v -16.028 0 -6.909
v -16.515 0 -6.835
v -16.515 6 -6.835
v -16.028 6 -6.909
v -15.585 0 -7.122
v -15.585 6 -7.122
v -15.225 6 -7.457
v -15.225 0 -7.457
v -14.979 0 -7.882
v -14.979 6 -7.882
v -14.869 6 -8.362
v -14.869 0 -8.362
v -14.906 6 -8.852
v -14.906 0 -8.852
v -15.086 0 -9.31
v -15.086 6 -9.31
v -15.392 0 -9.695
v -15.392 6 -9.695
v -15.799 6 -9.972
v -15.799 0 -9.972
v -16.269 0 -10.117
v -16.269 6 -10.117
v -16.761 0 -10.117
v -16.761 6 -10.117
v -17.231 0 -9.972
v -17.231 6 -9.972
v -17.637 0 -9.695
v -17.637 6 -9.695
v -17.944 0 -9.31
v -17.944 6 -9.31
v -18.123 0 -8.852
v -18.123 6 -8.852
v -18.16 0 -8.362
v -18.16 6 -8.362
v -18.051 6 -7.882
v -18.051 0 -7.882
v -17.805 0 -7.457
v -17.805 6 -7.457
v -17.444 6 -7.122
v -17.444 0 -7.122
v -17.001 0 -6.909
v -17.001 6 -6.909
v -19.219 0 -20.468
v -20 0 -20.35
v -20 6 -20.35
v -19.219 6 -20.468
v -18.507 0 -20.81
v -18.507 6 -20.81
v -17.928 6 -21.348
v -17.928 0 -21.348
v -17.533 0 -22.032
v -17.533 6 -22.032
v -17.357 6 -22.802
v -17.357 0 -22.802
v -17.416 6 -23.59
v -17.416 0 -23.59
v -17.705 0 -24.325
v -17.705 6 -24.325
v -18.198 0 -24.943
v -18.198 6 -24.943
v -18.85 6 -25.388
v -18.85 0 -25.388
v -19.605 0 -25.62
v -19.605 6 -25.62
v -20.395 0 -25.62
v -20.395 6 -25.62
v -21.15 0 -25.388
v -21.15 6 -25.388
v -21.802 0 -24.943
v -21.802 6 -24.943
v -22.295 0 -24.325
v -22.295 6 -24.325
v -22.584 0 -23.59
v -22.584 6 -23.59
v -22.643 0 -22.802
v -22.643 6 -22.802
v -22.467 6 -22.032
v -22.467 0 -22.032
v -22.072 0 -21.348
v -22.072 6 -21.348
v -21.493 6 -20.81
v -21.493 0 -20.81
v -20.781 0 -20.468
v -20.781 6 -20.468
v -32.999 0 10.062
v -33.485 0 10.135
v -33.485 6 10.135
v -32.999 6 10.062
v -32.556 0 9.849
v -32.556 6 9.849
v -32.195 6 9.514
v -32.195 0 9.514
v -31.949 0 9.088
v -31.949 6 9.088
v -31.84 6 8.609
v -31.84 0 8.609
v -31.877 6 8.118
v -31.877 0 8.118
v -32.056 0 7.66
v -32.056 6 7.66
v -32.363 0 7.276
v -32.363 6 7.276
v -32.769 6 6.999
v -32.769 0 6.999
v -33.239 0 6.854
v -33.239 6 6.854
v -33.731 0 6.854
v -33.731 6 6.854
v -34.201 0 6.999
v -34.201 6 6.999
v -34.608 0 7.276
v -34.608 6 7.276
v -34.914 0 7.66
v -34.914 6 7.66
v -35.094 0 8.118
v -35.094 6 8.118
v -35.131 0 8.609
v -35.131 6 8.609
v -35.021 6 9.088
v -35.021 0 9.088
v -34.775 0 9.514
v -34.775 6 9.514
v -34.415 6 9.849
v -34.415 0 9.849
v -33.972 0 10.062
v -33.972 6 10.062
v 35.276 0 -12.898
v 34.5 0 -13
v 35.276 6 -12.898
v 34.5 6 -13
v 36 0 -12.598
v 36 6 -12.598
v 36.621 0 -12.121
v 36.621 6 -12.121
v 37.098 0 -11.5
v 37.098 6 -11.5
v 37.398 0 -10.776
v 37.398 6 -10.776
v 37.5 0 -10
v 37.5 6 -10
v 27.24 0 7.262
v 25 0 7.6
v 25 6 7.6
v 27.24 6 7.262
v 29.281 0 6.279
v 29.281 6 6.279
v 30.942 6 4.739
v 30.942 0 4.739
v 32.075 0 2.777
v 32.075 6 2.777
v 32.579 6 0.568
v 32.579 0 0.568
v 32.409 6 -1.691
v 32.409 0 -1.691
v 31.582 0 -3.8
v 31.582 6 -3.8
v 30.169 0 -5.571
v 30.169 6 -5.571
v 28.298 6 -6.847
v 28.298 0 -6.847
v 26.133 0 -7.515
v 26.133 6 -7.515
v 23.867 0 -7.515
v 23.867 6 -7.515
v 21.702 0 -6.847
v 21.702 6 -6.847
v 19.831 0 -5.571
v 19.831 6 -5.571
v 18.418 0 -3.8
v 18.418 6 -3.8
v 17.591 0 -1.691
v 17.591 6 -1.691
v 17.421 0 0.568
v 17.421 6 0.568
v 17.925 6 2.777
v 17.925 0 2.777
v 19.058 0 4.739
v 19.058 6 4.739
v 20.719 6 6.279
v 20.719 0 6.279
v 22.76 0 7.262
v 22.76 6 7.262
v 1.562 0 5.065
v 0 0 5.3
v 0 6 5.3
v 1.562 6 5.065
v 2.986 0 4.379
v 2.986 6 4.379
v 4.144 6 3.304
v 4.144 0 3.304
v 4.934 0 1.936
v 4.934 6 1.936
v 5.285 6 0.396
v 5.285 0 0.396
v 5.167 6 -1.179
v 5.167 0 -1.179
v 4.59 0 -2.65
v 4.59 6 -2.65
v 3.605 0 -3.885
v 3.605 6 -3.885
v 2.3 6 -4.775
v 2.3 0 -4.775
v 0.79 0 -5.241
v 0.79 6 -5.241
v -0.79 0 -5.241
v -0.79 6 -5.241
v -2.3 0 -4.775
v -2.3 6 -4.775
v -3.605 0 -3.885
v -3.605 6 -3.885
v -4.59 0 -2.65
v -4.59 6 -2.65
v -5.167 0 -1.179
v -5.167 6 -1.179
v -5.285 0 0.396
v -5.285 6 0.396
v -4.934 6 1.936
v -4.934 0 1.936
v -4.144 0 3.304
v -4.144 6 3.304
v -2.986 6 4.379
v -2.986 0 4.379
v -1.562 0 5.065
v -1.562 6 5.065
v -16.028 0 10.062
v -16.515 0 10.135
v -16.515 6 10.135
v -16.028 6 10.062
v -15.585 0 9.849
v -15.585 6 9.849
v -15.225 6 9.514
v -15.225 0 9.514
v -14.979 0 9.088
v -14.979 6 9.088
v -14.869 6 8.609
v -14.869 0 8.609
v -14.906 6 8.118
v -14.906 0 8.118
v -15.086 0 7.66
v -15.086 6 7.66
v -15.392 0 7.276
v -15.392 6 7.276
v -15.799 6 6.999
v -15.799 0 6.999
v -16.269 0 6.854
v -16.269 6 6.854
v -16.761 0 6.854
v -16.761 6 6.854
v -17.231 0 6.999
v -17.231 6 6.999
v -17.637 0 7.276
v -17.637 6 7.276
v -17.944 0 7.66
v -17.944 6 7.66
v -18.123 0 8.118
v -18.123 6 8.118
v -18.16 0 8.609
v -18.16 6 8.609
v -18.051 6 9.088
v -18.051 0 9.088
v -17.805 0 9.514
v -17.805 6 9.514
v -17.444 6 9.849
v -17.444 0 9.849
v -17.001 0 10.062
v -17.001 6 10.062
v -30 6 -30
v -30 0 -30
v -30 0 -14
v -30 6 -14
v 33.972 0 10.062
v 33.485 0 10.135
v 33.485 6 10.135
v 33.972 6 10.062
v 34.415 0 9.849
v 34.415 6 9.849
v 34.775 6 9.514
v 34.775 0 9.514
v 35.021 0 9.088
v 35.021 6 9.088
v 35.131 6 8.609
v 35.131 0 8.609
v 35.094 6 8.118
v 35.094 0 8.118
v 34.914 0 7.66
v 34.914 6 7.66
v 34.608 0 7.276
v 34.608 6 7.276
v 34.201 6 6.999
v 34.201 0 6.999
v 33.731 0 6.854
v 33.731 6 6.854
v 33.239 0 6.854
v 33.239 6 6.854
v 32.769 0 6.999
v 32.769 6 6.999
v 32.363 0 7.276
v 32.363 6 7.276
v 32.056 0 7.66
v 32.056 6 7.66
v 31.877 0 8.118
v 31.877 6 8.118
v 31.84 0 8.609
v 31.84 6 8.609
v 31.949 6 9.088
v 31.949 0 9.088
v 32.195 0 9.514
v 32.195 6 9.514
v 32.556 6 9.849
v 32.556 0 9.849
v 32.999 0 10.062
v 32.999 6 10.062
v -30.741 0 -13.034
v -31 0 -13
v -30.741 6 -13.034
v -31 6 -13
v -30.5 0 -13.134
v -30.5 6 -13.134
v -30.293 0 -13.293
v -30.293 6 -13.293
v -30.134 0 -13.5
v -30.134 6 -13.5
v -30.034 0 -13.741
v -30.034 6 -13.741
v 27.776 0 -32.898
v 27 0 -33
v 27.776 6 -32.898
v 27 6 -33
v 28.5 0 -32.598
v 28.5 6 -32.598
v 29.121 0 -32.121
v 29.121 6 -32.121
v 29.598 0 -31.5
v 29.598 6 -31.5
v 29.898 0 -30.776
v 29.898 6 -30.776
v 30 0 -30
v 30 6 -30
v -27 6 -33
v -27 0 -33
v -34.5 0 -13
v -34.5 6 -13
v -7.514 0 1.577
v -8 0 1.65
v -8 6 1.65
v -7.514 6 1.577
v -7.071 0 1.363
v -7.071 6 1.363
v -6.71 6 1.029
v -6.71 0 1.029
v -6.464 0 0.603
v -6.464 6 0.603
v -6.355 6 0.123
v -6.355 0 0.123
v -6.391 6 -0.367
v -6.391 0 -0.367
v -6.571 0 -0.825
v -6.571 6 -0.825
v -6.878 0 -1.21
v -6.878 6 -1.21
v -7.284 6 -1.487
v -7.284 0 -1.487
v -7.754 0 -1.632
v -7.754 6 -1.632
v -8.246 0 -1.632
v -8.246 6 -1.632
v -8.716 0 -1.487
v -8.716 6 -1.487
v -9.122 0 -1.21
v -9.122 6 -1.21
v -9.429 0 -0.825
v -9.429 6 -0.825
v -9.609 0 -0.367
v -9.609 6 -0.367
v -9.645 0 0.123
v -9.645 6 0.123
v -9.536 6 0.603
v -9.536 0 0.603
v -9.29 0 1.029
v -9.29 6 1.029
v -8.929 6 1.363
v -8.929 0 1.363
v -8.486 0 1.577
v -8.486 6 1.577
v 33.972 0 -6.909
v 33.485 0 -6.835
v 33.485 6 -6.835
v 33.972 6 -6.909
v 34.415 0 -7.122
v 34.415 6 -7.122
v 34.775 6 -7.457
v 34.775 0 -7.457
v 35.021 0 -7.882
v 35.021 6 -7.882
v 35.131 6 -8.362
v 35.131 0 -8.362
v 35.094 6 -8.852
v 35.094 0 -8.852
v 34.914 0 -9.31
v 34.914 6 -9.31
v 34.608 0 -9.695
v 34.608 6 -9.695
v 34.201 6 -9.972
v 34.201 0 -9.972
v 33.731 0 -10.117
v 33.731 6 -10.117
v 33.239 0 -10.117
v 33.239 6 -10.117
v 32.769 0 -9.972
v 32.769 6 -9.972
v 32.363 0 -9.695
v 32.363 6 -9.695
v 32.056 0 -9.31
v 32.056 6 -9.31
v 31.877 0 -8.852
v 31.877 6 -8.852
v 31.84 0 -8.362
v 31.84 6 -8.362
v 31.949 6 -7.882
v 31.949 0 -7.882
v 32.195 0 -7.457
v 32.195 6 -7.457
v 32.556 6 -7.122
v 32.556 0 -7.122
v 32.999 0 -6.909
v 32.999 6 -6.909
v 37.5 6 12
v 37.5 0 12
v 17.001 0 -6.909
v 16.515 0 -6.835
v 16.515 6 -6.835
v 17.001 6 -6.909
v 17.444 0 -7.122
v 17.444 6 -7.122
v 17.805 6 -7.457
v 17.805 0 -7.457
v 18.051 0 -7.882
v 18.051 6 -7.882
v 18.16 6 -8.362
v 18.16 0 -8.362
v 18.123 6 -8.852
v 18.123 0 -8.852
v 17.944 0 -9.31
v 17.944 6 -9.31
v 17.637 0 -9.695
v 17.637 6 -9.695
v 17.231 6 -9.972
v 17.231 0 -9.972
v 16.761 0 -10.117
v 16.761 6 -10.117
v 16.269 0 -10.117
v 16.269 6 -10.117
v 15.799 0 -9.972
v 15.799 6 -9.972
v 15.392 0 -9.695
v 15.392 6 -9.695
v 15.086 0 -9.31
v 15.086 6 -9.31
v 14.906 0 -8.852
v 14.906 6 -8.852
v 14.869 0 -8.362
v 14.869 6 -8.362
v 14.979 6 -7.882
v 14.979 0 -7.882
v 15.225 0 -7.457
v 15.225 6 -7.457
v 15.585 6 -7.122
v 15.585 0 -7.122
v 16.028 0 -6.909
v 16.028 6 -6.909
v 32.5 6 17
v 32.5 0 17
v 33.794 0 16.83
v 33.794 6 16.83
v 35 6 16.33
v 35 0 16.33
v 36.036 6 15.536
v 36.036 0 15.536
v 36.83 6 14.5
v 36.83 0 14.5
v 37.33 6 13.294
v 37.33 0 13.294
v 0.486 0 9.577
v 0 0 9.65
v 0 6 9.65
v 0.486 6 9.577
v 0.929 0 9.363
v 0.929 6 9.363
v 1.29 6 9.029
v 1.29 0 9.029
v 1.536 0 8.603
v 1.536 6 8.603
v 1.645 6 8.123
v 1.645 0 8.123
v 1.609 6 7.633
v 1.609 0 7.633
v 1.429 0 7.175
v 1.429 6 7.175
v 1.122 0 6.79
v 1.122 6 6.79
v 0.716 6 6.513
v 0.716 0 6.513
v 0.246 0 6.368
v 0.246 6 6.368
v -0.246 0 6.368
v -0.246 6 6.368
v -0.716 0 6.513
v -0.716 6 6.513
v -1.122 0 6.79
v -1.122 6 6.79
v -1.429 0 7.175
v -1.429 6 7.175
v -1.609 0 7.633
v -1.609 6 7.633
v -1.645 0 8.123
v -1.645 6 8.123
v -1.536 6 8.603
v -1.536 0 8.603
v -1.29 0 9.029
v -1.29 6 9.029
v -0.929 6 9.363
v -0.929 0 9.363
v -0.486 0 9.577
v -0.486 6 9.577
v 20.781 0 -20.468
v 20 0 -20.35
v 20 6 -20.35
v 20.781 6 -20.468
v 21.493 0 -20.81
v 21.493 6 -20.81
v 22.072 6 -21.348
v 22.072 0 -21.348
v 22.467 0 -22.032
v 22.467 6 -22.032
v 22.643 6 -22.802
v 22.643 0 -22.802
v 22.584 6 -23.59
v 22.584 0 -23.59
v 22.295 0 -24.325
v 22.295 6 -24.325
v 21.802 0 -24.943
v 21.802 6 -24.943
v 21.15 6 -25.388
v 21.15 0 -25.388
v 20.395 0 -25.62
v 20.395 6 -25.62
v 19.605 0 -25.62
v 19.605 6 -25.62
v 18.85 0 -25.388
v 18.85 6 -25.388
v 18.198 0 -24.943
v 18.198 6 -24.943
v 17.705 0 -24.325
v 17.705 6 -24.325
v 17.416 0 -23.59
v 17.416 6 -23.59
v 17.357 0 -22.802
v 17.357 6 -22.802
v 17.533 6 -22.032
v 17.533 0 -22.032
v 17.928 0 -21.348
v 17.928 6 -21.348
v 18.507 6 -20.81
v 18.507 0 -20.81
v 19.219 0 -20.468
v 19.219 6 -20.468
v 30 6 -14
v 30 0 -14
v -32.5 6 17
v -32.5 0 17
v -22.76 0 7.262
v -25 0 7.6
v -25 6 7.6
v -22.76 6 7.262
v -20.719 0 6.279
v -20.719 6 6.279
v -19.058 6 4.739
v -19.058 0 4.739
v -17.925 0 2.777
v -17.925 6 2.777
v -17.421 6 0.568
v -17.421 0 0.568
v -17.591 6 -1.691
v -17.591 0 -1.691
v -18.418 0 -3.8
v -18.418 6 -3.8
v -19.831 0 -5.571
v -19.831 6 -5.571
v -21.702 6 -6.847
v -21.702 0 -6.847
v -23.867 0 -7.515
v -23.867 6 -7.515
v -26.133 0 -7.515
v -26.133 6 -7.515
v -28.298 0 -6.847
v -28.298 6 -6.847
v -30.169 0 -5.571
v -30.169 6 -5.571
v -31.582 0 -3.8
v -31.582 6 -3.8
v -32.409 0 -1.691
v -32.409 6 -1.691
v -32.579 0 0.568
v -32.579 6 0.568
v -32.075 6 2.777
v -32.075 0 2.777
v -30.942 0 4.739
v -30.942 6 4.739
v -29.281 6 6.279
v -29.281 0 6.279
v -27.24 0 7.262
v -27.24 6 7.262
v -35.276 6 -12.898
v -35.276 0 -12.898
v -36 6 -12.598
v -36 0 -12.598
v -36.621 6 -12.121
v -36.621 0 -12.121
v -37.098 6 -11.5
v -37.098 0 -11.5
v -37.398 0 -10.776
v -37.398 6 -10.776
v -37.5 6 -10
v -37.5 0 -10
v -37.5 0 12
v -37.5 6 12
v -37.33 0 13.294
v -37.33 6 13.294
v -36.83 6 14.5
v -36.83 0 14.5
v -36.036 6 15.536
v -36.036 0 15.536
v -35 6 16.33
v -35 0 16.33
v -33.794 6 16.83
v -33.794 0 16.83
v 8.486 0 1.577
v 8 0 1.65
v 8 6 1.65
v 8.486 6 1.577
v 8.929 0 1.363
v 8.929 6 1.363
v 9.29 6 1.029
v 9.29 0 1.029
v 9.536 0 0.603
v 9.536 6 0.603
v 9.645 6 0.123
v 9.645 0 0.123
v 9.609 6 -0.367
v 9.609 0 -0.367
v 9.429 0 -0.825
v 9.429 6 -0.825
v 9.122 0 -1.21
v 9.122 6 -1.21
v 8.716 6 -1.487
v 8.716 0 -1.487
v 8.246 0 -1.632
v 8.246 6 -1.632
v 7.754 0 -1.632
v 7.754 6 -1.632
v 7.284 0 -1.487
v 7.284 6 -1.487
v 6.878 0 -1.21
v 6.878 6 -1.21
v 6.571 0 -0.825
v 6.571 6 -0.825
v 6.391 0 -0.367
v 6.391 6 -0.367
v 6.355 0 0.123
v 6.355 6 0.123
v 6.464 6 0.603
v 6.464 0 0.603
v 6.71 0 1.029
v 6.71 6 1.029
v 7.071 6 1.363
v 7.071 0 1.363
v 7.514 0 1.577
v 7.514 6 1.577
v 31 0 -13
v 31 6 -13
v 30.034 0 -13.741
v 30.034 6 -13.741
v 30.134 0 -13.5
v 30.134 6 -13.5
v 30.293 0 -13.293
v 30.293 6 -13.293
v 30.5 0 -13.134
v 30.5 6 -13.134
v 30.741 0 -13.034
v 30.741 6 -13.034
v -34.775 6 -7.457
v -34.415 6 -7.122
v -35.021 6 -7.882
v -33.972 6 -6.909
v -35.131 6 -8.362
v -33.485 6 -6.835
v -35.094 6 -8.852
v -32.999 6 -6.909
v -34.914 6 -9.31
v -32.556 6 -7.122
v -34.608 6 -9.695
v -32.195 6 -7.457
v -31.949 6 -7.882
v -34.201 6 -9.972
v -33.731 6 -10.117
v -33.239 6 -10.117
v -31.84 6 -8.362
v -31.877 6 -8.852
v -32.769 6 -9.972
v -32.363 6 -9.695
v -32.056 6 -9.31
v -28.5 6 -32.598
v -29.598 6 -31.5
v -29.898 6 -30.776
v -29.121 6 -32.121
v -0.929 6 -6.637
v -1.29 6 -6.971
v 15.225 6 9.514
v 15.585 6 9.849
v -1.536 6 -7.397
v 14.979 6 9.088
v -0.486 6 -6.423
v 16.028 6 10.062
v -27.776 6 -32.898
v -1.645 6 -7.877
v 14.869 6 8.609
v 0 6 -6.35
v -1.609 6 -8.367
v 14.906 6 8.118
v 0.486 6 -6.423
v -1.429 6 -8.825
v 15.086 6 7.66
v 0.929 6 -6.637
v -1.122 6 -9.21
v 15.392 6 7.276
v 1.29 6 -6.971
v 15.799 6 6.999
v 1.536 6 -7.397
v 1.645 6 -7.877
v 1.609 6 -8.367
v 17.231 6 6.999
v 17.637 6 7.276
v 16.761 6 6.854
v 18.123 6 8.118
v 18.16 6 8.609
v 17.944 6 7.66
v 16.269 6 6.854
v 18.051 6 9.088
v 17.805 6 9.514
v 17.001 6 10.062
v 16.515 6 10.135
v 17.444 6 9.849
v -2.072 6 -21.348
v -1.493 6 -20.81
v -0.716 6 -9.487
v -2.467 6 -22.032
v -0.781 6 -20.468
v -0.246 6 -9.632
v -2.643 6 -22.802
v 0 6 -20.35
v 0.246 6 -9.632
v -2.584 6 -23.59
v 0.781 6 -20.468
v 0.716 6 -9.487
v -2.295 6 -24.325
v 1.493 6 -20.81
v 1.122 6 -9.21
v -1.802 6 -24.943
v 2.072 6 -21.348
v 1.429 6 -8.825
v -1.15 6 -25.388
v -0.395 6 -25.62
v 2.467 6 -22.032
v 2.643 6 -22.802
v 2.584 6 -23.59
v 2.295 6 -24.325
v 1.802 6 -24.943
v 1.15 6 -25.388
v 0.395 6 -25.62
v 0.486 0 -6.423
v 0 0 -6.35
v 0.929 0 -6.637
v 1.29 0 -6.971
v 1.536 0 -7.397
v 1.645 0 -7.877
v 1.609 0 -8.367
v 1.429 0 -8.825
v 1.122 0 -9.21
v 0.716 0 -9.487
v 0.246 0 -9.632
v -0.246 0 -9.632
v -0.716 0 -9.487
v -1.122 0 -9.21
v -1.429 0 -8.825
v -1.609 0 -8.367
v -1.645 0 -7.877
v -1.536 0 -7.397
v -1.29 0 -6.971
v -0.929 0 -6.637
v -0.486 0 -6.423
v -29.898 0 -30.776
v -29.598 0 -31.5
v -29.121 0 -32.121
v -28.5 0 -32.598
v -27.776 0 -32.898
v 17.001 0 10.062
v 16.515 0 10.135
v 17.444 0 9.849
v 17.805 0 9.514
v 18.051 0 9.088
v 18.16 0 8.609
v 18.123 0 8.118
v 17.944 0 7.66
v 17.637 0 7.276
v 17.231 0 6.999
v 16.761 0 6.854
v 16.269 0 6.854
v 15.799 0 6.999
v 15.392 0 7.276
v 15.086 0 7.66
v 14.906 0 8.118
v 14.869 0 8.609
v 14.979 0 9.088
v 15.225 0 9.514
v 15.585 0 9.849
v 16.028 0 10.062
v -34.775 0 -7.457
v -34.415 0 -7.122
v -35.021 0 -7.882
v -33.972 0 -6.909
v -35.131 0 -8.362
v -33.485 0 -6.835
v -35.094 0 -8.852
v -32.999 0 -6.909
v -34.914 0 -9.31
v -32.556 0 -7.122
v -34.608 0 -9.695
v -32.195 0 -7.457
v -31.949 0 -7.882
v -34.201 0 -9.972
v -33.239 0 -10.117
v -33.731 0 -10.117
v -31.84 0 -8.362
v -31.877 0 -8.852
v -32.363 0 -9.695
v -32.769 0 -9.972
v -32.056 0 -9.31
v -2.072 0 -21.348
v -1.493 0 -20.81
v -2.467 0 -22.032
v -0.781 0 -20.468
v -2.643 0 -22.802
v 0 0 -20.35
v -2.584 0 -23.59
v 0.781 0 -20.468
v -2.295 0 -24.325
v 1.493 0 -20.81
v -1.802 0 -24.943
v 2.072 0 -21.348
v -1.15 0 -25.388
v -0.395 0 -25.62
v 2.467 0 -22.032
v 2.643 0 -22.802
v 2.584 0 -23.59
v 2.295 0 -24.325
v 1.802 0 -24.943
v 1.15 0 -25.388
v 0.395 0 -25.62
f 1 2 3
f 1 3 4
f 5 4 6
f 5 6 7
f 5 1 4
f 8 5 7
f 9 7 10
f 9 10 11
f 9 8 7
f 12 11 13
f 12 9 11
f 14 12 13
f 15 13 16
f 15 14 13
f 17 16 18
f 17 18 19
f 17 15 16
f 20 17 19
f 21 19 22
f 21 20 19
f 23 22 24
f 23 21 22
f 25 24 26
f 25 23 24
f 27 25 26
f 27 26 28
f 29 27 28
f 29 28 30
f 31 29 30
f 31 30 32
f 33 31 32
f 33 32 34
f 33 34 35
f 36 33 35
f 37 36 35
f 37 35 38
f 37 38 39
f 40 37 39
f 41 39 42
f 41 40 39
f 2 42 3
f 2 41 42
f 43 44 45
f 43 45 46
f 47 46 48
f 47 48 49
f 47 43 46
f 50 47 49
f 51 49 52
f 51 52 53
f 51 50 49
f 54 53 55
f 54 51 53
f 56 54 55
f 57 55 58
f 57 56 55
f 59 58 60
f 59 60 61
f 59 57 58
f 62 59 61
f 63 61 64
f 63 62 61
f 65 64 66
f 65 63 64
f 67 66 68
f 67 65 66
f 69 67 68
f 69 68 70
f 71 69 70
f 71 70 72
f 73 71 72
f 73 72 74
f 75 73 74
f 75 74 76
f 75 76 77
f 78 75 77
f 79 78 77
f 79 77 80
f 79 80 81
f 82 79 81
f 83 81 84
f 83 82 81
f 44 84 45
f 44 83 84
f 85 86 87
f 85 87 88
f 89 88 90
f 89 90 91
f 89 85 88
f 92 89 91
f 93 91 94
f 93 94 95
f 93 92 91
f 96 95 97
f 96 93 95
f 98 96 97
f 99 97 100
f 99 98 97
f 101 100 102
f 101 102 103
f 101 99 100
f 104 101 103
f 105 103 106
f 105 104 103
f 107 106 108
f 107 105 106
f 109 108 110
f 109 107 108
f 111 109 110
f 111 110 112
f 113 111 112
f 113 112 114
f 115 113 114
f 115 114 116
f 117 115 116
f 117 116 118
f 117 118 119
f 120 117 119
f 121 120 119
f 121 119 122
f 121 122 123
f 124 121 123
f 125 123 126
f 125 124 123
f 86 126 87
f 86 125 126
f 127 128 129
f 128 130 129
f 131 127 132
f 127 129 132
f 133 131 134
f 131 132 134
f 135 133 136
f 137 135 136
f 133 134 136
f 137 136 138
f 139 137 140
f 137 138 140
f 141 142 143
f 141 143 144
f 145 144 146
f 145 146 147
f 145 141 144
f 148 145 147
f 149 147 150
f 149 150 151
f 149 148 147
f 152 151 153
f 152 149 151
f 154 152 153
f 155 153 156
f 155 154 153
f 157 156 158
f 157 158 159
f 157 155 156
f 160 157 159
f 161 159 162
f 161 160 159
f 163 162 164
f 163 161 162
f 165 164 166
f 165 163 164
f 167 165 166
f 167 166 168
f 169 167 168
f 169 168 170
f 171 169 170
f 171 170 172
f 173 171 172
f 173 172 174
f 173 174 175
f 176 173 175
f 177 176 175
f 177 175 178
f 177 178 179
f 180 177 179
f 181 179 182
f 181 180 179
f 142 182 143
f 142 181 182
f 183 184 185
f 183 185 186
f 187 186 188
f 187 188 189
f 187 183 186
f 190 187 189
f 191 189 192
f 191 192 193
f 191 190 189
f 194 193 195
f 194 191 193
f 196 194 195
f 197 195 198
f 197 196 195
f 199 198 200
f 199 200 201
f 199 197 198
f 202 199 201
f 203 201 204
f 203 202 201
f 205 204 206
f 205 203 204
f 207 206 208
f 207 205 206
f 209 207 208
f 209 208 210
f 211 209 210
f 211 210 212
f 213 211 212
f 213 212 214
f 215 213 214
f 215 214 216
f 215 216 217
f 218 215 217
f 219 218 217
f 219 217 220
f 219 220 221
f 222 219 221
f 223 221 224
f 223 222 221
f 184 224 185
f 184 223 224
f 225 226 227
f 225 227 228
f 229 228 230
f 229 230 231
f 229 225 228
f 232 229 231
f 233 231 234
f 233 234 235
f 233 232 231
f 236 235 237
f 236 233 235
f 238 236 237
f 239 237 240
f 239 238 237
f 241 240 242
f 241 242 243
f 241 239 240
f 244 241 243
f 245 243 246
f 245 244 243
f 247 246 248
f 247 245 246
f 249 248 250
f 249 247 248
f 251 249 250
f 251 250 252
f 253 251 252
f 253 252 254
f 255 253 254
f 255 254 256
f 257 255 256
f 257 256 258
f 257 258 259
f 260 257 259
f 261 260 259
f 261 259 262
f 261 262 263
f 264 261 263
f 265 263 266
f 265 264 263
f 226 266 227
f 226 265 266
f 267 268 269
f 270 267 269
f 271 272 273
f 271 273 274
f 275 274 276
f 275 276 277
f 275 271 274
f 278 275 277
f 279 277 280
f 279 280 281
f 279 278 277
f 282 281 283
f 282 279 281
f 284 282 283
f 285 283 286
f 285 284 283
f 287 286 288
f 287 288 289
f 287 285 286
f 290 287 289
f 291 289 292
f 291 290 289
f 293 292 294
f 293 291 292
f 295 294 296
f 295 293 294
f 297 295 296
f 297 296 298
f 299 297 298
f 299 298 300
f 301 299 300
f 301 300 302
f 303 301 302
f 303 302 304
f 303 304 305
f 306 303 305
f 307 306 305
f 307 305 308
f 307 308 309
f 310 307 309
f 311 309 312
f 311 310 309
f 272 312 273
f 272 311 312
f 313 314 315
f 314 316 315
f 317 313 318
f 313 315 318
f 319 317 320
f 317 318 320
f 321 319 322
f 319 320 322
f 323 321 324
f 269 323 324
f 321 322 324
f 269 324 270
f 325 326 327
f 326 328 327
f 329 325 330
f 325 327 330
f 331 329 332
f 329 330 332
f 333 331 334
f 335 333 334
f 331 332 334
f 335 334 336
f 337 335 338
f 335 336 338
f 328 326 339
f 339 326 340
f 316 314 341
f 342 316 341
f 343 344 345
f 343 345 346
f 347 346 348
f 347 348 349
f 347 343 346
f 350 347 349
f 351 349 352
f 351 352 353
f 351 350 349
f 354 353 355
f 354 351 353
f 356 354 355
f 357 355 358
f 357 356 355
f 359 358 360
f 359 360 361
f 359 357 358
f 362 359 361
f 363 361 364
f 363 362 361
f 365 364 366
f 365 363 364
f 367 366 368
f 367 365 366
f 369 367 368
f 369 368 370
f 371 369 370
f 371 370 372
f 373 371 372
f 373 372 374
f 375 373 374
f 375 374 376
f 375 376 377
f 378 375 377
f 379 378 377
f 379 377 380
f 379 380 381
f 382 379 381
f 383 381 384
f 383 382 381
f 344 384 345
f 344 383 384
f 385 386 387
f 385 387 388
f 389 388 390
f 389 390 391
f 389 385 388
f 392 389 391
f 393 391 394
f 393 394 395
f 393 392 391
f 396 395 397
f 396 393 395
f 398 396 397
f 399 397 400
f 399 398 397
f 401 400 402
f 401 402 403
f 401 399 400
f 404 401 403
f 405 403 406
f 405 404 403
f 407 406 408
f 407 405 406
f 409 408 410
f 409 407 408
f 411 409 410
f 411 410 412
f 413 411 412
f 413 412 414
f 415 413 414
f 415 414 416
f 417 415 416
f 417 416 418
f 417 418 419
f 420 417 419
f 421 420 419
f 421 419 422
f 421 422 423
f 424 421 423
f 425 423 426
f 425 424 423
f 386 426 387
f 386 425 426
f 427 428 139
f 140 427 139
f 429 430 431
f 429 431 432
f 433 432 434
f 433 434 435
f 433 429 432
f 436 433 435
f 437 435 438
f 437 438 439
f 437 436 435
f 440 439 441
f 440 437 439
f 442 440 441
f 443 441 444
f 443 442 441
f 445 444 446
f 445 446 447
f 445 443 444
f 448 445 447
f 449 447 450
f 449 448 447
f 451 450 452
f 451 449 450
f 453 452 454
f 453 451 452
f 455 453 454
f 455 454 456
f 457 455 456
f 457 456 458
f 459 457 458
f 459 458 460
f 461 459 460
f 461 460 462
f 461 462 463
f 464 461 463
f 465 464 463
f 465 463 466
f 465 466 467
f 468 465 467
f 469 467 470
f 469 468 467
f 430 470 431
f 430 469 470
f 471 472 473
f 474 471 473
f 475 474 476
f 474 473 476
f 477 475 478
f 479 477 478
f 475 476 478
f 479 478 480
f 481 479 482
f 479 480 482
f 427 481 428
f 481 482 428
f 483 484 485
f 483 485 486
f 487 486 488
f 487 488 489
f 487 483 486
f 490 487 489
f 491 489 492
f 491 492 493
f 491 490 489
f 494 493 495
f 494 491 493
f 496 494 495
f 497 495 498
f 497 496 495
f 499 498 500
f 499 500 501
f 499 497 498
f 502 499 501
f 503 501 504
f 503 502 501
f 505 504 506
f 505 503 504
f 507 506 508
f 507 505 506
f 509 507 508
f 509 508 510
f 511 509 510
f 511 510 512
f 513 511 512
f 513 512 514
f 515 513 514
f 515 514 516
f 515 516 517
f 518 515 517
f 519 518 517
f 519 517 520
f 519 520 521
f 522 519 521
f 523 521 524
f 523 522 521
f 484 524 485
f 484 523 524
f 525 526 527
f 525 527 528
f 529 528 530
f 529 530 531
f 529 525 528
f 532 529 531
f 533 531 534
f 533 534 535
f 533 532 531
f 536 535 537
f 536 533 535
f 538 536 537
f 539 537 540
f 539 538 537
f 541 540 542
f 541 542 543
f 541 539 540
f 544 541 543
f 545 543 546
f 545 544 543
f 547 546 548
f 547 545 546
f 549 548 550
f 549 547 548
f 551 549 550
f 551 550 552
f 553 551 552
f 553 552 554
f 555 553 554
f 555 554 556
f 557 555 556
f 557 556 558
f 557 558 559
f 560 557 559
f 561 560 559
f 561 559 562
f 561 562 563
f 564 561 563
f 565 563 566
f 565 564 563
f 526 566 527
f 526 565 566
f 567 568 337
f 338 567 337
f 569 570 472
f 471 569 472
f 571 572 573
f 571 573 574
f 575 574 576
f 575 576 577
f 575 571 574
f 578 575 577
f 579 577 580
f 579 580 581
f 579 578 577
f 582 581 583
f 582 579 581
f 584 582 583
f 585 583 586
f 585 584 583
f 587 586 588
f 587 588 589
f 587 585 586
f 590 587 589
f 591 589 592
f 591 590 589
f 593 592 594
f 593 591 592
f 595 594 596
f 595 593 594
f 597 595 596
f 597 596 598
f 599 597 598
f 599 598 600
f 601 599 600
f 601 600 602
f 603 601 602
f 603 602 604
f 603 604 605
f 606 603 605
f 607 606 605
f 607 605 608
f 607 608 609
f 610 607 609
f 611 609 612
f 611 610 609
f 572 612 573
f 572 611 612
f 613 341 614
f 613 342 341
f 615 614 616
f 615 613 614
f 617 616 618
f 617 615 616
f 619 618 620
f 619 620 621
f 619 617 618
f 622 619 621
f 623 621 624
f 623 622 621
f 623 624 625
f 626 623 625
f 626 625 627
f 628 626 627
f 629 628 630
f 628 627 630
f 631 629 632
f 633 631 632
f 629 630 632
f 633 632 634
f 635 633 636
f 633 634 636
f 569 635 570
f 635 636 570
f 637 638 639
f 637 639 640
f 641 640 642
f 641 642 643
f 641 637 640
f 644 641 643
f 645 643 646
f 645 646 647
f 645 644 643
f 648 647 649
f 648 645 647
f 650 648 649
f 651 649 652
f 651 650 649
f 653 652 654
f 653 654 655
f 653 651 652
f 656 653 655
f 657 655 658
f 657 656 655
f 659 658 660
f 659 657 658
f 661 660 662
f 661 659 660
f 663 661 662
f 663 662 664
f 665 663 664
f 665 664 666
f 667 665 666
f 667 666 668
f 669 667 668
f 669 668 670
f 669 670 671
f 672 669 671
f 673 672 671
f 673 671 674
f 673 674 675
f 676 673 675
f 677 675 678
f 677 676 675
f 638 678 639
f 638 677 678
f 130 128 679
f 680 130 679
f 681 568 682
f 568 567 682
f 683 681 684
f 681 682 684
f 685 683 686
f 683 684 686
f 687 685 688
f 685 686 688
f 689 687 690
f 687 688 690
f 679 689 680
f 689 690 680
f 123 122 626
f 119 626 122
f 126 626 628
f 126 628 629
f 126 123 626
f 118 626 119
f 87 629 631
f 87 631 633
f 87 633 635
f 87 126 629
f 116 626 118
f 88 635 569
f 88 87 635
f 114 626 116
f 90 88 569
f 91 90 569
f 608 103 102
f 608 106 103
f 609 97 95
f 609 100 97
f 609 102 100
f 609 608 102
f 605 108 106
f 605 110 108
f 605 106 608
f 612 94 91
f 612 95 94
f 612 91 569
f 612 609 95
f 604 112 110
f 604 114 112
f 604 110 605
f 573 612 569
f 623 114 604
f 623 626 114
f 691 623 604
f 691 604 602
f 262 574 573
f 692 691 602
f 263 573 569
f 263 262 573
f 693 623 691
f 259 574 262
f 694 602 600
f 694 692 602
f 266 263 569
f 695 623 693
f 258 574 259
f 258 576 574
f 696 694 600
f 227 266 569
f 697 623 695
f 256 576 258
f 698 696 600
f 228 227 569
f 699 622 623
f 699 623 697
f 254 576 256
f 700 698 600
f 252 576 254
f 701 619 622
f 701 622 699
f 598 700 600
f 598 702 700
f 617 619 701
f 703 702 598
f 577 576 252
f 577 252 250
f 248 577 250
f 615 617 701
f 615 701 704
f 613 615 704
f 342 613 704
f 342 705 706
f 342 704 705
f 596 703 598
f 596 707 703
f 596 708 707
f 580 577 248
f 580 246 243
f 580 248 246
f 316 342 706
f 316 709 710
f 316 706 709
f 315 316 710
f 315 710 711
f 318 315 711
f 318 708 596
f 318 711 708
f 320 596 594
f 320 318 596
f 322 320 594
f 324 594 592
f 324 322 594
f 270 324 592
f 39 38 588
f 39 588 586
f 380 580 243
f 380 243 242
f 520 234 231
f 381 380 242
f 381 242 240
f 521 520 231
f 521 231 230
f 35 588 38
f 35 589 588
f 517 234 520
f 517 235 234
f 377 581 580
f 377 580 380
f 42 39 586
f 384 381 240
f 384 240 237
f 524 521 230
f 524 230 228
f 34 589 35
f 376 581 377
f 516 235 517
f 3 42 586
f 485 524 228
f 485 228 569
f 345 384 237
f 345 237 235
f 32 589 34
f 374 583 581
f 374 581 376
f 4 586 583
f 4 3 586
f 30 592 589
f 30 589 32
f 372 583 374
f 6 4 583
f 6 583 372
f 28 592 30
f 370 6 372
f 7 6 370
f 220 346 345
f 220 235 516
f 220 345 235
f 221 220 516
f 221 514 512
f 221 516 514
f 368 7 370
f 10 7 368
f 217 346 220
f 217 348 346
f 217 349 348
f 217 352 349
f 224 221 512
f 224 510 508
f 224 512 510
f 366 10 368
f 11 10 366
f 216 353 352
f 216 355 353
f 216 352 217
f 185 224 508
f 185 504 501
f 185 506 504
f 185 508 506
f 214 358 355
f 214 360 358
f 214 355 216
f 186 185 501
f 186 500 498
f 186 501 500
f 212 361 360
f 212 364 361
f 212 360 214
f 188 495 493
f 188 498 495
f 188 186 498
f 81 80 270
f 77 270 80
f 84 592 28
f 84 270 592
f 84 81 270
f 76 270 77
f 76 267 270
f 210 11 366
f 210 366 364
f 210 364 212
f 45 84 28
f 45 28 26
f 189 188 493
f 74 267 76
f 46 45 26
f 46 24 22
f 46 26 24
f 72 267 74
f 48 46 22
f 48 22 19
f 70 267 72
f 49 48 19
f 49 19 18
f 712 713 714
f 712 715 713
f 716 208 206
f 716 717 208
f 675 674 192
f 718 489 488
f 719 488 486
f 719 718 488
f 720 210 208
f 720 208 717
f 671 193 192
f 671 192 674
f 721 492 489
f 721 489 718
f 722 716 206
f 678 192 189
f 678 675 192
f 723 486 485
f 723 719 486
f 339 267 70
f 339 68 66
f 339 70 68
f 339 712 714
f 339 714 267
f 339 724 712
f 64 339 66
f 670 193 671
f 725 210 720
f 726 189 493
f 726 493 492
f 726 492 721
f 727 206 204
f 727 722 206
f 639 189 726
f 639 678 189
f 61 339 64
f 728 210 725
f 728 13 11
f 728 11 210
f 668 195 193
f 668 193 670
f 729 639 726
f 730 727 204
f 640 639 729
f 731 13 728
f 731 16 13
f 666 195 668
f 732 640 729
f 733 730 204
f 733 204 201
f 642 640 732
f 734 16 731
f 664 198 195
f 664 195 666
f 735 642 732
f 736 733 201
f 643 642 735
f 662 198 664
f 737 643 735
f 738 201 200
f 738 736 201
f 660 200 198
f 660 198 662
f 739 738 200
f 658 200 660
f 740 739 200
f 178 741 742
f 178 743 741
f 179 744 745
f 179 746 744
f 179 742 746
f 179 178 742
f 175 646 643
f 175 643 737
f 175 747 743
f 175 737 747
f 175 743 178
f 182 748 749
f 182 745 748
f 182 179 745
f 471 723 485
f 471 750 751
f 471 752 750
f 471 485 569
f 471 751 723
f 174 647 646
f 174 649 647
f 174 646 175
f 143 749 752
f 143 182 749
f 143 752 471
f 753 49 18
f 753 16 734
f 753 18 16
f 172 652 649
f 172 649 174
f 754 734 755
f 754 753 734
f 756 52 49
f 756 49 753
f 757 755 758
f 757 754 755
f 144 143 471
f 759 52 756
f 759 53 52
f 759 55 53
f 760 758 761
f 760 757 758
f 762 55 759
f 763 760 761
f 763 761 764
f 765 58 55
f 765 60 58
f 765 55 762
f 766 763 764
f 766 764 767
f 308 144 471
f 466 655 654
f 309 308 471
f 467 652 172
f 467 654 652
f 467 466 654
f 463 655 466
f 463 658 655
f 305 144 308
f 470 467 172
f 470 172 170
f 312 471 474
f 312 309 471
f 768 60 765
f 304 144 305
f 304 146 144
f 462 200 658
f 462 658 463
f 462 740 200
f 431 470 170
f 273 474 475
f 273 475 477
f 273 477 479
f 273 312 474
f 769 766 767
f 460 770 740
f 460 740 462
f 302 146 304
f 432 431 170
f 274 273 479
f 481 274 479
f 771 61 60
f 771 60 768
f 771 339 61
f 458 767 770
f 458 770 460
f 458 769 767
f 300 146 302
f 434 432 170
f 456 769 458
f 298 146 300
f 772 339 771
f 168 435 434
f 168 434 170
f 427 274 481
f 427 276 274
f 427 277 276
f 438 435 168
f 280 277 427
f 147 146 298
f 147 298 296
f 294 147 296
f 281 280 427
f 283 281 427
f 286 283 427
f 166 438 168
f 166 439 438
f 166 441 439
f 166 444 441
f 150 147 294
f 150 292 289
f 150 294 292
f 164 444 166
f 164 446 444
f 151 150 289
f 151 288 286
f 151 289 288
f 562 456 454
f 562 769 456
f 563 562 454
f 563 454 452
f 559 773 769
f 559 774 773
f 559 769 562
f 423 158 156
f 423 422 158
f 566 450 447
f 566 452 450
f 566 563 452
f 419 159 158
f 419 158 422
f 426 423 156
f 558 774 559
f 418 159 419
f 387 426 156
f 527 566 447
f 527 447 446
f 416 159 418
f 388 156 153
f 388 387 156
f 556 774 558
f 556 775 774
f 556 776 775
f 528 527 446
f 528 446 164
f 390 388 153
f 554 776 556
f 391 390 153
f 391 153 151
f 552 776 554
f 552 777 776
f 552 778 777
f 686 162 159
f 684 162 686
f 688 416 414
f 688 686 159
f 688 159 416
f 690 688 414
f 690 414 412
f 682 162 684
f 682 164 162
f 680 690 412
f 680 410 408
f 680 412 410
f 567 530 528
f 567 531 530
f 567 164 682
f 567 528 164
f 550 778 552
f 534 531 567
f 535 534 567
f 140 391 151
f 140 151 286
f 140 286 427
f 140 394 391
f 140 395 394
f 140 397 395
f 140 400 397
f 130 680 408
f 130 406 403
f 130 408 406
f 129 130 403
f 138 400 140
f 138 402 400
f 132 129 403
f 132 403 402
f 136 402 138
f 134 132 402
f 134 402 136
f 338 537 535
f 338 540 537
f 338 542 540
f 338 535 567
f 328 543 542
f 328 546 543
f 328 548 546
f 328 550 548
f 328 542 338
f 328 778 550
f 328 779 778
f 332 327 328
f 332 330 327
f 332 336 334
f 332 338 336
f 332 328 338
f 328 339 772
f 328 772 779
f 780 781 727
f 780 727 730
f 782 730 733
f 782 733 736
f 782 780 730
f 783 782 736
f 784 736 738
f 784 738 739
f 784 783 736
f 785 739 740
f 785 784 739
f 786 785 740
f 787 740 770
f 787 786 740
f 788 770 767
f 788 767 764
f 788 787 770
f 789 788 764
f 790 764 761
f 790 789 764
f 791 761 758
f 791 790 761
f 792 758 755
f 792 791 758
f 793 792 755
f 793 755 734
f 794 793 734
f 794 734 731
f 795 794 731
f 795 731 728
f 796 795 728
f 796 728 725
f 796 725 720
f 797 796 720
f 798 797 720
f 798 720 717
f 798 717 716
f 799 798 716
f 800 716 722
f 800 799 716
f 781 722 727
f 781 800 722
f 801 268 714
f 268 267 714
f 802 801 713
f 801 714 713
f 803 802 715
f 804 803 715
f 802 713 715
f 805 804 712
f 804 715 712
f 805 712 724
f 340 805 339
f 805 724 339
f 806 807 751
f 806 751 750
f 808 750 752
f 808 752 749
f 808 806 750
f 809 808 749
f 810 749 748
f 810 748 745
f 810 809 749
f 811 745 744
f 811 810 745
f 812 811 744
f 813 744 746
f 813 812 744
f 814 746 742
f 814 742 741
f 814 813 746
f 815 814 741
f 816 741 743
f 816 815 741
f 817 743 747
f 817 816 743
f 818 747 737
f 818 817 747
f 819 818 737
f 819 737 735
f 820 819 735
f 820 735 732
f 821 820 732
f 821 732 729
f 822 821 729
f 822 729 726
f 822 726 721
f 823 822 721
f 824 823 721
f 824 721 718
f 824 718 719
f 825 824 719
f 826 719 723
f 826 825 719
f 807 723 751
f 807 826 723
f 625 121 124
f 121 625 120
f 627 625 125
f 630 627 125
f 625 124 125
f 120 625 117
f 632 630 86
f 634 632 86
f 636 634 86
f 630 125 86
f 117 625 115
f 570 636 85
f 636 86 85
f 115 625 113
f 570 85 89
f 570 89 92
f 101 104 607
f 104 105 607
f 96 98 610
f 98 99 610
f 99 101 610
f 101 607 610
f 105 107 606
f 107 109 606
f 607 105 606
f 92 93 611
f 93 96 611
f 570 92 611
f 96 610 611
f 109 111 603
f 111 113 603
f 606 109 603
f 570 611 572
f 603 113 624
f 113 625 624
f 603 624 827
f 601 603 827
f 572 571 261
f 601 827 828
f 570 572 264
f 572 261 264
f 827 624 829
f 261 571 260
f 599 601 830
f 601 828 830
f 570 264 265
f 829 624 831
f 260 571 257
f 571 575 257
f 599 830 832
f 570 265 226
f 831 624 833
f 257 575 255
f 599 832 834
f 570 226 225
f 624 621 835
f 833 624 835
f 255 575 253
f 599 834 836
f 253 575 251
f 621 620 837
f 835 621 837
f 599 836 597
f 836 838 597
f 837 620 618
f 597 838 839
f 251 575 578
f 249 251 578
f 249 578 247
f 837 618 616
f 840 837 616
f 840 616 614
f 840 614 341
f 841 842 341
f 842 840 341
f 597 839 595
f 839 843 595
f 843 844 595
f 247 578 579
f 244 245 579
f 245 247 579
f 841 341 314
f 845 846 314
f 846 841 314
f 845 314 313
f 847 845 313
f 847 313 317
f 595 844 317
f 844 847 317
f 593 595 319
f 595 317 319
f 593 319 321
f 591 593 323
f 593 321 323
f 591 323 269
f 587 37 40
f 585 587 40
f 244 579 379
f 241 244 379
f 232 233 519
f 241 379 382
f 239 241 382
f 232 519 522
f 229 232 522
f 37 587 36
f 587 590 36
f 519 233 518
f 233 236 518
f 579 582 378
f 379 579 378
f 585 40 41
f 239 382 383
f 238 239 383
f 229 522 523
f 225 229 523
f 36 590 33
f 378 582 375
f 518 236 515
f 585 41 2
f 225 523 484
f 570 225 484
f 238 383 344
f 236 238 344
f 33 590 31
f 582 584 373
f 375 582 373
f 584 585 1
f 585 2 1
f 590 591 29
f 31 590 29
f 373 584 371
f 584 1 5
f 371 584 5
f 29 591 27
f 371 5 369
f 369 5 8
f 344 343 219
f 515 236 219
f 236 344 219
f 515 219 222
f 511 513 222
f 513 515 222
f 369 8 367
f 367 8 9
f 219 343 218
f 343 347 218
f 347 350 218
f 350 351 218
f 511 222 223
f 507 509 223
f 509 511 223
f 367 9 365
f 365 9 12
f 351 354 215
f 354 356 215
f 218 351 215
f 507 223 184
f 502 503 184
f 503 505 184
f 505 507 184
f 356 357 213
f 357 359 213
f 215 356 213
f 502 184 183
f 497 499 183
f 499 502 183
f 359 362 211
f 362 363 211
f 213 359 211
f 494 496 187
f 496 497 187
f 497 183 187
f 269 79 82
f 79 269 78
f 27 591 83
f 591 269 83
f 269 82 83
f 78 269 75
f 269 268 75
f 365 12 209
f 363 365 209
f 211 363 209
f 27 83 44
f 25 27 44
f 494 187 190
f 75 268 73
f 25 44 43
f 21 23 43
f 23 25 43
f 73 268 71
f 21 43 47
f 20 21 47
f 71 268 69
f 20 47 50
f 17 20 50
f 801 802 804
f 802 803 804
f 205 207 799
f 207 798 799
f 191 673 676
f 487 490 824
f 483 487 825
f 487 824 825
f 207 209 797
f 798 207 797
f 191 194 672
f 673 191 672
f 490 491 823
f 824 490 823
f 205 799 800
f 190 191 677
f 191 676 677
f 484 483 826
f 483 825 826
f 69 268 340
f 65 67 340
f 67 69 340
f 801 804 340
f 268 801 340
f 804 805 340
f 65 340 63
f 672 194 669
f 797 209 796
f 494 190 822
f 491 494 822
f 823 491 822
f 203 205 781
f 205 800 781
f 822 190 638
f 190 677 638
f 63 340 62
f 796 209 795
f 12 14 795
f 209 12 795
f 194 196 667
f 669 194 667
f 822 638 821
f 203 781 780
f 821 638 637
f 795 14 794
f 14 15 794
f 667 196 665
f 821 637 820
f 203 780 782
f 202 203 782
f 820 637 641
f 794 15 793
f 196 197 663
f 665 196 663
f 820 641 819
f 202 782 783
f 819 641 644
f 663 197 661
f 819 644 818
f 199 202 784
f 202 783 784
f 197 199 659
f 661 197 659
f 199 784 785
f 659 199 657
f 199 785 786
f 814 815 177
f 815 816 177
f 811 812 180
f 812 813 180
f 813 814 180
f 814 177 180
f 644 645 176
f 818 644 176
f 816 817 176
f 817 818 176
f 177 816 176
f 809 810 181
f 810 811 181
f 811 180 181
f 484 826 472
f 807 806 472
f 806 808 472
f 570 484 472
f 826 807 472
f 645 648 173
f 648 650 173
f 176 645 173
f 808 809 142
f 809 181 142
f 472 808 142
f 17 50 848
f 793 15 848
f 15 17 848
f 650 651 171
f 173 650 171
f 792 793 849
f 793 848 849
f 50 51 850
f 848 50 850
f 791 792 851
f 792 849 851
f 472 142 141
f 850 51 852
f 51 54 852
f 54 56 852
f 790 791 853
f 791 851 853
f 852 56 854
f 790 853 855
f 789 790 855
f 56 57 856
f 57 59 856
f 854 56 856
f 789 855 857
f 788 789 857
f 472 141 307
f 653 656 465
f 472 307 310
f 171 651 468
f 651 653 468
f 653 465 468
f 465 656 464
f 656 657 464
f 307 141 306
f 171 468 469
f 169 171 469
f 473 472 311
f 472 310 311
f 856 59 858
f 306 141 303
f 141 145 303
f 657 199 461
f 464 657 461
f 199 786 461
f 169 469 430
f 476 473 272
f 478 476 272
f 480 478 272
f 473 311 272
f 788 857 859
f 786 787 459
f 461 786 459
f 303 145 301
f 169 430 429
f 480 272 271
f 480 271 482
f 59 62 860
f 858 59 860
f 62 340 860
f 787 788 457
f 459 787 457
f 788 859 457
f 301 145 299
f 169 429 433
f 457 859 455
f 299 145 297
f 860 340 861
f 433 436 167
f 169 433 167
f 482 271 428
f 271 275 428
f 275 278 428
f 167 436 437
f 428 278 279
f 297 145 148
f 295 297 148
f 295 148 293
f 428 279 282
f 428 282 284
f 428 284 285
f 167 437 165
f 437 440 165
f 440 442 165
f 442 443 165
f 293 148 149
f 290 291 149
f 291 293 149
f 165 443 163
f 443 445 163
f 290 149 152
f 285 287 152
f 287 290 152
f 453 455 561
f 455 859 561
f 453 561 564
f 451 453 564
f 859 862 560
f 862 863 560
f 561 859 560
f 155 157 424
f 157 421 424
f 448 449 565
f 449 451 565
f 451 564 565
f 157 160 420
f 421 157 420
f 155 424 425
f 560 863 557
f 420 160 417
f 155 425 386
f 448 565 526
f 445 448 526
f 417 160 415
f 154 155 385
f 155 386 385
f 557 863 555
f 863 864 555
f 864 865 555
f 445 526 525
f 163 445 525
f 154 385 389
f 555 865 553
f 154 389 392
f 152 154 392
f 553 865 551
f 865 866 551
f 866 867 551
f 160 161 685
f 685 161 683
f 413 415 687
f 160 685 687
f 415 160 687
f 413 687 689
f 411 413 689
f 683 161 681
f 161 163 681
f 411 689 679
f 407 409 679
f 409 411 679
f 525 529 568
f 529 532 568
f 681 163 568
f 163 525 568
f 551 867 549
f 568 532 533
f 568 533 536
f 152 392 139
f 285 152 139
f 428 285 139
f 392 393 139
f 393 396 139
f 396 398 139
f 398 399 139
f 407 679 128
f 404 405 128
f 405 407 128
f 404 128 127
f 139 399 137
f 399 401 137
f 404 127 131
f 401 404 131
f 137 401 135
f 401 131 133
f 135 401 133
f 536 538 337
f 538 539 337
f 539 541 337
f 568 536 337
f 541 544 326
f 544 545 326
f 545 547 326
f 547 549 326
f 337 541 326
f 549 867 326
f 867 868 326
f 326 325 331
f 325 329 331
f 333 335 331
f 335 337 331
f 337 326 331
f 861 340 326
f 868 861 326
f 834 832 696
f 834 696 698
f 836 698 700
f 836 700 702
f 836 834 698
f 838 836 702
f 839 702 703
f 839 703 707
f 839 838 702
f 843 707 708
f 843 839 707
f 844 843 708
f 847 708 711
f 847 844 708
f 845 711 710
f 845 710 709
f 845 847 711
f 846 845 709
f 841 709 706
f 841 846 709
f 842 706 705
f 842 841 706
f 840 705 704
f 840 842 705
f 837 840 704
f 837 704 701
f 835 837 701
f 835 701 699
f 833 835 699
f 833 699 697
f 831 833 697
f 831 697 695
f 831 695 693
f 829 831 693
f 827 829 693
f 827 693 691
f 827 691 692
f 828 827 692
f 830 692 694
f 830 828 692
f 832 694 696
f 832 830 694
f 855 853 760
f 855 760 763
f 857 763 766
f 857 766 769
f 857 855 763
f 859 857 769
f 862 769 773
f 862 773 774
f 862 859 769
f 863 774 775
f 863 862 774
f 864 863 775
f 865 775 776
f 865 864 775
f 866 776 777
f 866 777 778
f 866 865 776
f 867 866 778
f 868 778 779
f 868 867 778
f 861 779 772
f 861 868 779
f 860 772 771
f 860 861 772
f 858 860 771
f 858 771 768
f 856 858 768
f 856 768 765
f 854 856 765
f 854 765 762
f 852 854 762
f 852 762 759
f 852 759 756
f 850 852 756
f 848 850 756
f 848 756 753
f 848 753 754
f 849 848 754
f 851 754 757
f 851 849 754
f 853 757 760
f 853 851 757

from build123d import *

# Parameters (mm, degrees)
SKETCH_1_R      = 1.65
SKETCH_1_R_2    = 7.6
SKETCH_1_R_3    = 5.3
SKETCH_1_R_4    = 2.65
EXTRUDE_1_DEPTH = 6
FILLET_1_R      = 3
FILLET_2_R      = 1


with BuildPart() as part:
    # 草图1 → 凸台-拉伸1 (new body)
    with BuildSketch(Plane(origin=(0, 0, 0), x_dir=(1, 0, 0), z_dir=(0, 1, 0))):
        with BuildLine():
            Line((-30, 13), (-37.5, 13))
            Line((-37.5, 13), (-37.5, -12))
            ThreePointArc((-37.5, -12), (-36.035533906, -15.535533906), (-32.5, -17))
            Line((-32.5, -17), (32.5, -17))
            ThreePointArc((32.5, -17), (36.035533906, -15.535533906), (37.5, -12))
            Line((37.5, -12), (37.5, 13))
            Line((37.5, 13), (30, 13))
            Line((30, 13), (30, 33))
            Line((30, 33), (-30, 33))
            Line((-30, 33), (-30, 13))
        make_face()
        with Locations(Location((-33.485281374, -8.485281374, 0), (0, 0, 270))):
            Circle(SKETCH_1_R, mode=Mode.SUBTRACT)
        with Locations(Location((-16.514718626, -8.485281374, 0), (0, 0, 270))):
            Circle(SKETCH_1_R, mode=Mode.SUBTRACT)
        with Locations(Location((0, -8, 0), (0, 0, 270))):
            Circle(SKETCH_1_R, mode=Mode.SUBTRACT)
        with Locations(Location((-25, 0, 0), (0, 0, 270))):
            Circle(SKETCH_1_R_2, mode=Mode.SUBTRACT)
        with Locations(Location((-8, 0, 0), (0, 0, 270))):
            Circle(SKETCH_1_R, mode=Mode.SUBTRACT)
        with Locations(Location((0, 0, 0), (0, 0, 270))):
            Circle(SKETCH_1_R_3, mode=Mode.SUBTRACT)
        with Locations(Location((0, 8, 0), (0, 0, 270))):
            Circle(SKETCH_1_R, mode=Mode.SUBTRACT)
        with Locations(Location((16.514718626, -8.485281374, 0), (0, 0, 270))):
            Circle(SKETCH_1_R, mode=Mode.SUBTRACT)
        with Locations(Location((33.485281374, -8.485281374, 0), (0, 0, 270))):
            Circle(SKETCH_1_R, mode=Mode.SUBTRACT)
        with Locations(Location((8, 0, 0), (0, 0, 270))):
            Circle(SKETCH_1_R, mode=Mode.SUBTRACT)
        with Locations(Location((25, 0, 0), (0, 0, 270))):
            Circle(SKETCH_1_R_2, mode=Mode.SUBTRACT)
        with Locations(Location((-33.485281374, 8.485281374, 0), (0, 0, 270))):
            Circle(SKETCH_1_R, mode=Mode.SUBTRACT)
        with Locations(Location((-16.514718626, 8.485281374, 0), (0, 0, 270))):
            Circle(SKETCH_1_R, mode=Mode.SUBTRACT)
        with Locations(Location((-20, 23, 0), (0, 0, 270))):
            Circle(SKETCH_1_R_4, mode=Mode.SUBTRACT)
        with Locations(Location((0, 23, 0), (0, 0, 270))):
            Circle(SKETCH_1_R_4, mode=Mode.SUBTRACT)
        with Locations(Location((16.514718626, 8.485281374, 0), (0, 0, 270))):
            Circle(SKETCH_1_R, mode=Mode.SUBTRACT)
        with Locations(Location((33.485281374, 8.485281374, 0), (0, 0, 270))):
            Circle(SKETCH_1_R, mode=Mode.SUBTRACT)
        with Locations(Location((20, 23, 0), (0, 0, 270))):
            Circle(SKETCH_1_R_4, mode=Mode.SUBTRACT)
    extrude(amount=EXTRUDE_1_DEPTH)

    # 圆角1
    fillet_1_edges = [part.edges().sort_by_distance(p)[0] for p in [
        (-37.5, 3, -13),
        (-30, 3, -33),
        (30, 3, -33),
        (37.5, 3, -13),
    ]]
    fillet(fillet_1_edges, radius=FILLET_1_R)

    # 圆角2
    fillet_2_edges = [part.edges().sort_by_distance(p)[0] for p in [
        (-30, 3, -13),
        (30, 3, -13),
    ]]
    fillet(fillet_2_edges, radius=FILLET_2_R)


solid = part.part
